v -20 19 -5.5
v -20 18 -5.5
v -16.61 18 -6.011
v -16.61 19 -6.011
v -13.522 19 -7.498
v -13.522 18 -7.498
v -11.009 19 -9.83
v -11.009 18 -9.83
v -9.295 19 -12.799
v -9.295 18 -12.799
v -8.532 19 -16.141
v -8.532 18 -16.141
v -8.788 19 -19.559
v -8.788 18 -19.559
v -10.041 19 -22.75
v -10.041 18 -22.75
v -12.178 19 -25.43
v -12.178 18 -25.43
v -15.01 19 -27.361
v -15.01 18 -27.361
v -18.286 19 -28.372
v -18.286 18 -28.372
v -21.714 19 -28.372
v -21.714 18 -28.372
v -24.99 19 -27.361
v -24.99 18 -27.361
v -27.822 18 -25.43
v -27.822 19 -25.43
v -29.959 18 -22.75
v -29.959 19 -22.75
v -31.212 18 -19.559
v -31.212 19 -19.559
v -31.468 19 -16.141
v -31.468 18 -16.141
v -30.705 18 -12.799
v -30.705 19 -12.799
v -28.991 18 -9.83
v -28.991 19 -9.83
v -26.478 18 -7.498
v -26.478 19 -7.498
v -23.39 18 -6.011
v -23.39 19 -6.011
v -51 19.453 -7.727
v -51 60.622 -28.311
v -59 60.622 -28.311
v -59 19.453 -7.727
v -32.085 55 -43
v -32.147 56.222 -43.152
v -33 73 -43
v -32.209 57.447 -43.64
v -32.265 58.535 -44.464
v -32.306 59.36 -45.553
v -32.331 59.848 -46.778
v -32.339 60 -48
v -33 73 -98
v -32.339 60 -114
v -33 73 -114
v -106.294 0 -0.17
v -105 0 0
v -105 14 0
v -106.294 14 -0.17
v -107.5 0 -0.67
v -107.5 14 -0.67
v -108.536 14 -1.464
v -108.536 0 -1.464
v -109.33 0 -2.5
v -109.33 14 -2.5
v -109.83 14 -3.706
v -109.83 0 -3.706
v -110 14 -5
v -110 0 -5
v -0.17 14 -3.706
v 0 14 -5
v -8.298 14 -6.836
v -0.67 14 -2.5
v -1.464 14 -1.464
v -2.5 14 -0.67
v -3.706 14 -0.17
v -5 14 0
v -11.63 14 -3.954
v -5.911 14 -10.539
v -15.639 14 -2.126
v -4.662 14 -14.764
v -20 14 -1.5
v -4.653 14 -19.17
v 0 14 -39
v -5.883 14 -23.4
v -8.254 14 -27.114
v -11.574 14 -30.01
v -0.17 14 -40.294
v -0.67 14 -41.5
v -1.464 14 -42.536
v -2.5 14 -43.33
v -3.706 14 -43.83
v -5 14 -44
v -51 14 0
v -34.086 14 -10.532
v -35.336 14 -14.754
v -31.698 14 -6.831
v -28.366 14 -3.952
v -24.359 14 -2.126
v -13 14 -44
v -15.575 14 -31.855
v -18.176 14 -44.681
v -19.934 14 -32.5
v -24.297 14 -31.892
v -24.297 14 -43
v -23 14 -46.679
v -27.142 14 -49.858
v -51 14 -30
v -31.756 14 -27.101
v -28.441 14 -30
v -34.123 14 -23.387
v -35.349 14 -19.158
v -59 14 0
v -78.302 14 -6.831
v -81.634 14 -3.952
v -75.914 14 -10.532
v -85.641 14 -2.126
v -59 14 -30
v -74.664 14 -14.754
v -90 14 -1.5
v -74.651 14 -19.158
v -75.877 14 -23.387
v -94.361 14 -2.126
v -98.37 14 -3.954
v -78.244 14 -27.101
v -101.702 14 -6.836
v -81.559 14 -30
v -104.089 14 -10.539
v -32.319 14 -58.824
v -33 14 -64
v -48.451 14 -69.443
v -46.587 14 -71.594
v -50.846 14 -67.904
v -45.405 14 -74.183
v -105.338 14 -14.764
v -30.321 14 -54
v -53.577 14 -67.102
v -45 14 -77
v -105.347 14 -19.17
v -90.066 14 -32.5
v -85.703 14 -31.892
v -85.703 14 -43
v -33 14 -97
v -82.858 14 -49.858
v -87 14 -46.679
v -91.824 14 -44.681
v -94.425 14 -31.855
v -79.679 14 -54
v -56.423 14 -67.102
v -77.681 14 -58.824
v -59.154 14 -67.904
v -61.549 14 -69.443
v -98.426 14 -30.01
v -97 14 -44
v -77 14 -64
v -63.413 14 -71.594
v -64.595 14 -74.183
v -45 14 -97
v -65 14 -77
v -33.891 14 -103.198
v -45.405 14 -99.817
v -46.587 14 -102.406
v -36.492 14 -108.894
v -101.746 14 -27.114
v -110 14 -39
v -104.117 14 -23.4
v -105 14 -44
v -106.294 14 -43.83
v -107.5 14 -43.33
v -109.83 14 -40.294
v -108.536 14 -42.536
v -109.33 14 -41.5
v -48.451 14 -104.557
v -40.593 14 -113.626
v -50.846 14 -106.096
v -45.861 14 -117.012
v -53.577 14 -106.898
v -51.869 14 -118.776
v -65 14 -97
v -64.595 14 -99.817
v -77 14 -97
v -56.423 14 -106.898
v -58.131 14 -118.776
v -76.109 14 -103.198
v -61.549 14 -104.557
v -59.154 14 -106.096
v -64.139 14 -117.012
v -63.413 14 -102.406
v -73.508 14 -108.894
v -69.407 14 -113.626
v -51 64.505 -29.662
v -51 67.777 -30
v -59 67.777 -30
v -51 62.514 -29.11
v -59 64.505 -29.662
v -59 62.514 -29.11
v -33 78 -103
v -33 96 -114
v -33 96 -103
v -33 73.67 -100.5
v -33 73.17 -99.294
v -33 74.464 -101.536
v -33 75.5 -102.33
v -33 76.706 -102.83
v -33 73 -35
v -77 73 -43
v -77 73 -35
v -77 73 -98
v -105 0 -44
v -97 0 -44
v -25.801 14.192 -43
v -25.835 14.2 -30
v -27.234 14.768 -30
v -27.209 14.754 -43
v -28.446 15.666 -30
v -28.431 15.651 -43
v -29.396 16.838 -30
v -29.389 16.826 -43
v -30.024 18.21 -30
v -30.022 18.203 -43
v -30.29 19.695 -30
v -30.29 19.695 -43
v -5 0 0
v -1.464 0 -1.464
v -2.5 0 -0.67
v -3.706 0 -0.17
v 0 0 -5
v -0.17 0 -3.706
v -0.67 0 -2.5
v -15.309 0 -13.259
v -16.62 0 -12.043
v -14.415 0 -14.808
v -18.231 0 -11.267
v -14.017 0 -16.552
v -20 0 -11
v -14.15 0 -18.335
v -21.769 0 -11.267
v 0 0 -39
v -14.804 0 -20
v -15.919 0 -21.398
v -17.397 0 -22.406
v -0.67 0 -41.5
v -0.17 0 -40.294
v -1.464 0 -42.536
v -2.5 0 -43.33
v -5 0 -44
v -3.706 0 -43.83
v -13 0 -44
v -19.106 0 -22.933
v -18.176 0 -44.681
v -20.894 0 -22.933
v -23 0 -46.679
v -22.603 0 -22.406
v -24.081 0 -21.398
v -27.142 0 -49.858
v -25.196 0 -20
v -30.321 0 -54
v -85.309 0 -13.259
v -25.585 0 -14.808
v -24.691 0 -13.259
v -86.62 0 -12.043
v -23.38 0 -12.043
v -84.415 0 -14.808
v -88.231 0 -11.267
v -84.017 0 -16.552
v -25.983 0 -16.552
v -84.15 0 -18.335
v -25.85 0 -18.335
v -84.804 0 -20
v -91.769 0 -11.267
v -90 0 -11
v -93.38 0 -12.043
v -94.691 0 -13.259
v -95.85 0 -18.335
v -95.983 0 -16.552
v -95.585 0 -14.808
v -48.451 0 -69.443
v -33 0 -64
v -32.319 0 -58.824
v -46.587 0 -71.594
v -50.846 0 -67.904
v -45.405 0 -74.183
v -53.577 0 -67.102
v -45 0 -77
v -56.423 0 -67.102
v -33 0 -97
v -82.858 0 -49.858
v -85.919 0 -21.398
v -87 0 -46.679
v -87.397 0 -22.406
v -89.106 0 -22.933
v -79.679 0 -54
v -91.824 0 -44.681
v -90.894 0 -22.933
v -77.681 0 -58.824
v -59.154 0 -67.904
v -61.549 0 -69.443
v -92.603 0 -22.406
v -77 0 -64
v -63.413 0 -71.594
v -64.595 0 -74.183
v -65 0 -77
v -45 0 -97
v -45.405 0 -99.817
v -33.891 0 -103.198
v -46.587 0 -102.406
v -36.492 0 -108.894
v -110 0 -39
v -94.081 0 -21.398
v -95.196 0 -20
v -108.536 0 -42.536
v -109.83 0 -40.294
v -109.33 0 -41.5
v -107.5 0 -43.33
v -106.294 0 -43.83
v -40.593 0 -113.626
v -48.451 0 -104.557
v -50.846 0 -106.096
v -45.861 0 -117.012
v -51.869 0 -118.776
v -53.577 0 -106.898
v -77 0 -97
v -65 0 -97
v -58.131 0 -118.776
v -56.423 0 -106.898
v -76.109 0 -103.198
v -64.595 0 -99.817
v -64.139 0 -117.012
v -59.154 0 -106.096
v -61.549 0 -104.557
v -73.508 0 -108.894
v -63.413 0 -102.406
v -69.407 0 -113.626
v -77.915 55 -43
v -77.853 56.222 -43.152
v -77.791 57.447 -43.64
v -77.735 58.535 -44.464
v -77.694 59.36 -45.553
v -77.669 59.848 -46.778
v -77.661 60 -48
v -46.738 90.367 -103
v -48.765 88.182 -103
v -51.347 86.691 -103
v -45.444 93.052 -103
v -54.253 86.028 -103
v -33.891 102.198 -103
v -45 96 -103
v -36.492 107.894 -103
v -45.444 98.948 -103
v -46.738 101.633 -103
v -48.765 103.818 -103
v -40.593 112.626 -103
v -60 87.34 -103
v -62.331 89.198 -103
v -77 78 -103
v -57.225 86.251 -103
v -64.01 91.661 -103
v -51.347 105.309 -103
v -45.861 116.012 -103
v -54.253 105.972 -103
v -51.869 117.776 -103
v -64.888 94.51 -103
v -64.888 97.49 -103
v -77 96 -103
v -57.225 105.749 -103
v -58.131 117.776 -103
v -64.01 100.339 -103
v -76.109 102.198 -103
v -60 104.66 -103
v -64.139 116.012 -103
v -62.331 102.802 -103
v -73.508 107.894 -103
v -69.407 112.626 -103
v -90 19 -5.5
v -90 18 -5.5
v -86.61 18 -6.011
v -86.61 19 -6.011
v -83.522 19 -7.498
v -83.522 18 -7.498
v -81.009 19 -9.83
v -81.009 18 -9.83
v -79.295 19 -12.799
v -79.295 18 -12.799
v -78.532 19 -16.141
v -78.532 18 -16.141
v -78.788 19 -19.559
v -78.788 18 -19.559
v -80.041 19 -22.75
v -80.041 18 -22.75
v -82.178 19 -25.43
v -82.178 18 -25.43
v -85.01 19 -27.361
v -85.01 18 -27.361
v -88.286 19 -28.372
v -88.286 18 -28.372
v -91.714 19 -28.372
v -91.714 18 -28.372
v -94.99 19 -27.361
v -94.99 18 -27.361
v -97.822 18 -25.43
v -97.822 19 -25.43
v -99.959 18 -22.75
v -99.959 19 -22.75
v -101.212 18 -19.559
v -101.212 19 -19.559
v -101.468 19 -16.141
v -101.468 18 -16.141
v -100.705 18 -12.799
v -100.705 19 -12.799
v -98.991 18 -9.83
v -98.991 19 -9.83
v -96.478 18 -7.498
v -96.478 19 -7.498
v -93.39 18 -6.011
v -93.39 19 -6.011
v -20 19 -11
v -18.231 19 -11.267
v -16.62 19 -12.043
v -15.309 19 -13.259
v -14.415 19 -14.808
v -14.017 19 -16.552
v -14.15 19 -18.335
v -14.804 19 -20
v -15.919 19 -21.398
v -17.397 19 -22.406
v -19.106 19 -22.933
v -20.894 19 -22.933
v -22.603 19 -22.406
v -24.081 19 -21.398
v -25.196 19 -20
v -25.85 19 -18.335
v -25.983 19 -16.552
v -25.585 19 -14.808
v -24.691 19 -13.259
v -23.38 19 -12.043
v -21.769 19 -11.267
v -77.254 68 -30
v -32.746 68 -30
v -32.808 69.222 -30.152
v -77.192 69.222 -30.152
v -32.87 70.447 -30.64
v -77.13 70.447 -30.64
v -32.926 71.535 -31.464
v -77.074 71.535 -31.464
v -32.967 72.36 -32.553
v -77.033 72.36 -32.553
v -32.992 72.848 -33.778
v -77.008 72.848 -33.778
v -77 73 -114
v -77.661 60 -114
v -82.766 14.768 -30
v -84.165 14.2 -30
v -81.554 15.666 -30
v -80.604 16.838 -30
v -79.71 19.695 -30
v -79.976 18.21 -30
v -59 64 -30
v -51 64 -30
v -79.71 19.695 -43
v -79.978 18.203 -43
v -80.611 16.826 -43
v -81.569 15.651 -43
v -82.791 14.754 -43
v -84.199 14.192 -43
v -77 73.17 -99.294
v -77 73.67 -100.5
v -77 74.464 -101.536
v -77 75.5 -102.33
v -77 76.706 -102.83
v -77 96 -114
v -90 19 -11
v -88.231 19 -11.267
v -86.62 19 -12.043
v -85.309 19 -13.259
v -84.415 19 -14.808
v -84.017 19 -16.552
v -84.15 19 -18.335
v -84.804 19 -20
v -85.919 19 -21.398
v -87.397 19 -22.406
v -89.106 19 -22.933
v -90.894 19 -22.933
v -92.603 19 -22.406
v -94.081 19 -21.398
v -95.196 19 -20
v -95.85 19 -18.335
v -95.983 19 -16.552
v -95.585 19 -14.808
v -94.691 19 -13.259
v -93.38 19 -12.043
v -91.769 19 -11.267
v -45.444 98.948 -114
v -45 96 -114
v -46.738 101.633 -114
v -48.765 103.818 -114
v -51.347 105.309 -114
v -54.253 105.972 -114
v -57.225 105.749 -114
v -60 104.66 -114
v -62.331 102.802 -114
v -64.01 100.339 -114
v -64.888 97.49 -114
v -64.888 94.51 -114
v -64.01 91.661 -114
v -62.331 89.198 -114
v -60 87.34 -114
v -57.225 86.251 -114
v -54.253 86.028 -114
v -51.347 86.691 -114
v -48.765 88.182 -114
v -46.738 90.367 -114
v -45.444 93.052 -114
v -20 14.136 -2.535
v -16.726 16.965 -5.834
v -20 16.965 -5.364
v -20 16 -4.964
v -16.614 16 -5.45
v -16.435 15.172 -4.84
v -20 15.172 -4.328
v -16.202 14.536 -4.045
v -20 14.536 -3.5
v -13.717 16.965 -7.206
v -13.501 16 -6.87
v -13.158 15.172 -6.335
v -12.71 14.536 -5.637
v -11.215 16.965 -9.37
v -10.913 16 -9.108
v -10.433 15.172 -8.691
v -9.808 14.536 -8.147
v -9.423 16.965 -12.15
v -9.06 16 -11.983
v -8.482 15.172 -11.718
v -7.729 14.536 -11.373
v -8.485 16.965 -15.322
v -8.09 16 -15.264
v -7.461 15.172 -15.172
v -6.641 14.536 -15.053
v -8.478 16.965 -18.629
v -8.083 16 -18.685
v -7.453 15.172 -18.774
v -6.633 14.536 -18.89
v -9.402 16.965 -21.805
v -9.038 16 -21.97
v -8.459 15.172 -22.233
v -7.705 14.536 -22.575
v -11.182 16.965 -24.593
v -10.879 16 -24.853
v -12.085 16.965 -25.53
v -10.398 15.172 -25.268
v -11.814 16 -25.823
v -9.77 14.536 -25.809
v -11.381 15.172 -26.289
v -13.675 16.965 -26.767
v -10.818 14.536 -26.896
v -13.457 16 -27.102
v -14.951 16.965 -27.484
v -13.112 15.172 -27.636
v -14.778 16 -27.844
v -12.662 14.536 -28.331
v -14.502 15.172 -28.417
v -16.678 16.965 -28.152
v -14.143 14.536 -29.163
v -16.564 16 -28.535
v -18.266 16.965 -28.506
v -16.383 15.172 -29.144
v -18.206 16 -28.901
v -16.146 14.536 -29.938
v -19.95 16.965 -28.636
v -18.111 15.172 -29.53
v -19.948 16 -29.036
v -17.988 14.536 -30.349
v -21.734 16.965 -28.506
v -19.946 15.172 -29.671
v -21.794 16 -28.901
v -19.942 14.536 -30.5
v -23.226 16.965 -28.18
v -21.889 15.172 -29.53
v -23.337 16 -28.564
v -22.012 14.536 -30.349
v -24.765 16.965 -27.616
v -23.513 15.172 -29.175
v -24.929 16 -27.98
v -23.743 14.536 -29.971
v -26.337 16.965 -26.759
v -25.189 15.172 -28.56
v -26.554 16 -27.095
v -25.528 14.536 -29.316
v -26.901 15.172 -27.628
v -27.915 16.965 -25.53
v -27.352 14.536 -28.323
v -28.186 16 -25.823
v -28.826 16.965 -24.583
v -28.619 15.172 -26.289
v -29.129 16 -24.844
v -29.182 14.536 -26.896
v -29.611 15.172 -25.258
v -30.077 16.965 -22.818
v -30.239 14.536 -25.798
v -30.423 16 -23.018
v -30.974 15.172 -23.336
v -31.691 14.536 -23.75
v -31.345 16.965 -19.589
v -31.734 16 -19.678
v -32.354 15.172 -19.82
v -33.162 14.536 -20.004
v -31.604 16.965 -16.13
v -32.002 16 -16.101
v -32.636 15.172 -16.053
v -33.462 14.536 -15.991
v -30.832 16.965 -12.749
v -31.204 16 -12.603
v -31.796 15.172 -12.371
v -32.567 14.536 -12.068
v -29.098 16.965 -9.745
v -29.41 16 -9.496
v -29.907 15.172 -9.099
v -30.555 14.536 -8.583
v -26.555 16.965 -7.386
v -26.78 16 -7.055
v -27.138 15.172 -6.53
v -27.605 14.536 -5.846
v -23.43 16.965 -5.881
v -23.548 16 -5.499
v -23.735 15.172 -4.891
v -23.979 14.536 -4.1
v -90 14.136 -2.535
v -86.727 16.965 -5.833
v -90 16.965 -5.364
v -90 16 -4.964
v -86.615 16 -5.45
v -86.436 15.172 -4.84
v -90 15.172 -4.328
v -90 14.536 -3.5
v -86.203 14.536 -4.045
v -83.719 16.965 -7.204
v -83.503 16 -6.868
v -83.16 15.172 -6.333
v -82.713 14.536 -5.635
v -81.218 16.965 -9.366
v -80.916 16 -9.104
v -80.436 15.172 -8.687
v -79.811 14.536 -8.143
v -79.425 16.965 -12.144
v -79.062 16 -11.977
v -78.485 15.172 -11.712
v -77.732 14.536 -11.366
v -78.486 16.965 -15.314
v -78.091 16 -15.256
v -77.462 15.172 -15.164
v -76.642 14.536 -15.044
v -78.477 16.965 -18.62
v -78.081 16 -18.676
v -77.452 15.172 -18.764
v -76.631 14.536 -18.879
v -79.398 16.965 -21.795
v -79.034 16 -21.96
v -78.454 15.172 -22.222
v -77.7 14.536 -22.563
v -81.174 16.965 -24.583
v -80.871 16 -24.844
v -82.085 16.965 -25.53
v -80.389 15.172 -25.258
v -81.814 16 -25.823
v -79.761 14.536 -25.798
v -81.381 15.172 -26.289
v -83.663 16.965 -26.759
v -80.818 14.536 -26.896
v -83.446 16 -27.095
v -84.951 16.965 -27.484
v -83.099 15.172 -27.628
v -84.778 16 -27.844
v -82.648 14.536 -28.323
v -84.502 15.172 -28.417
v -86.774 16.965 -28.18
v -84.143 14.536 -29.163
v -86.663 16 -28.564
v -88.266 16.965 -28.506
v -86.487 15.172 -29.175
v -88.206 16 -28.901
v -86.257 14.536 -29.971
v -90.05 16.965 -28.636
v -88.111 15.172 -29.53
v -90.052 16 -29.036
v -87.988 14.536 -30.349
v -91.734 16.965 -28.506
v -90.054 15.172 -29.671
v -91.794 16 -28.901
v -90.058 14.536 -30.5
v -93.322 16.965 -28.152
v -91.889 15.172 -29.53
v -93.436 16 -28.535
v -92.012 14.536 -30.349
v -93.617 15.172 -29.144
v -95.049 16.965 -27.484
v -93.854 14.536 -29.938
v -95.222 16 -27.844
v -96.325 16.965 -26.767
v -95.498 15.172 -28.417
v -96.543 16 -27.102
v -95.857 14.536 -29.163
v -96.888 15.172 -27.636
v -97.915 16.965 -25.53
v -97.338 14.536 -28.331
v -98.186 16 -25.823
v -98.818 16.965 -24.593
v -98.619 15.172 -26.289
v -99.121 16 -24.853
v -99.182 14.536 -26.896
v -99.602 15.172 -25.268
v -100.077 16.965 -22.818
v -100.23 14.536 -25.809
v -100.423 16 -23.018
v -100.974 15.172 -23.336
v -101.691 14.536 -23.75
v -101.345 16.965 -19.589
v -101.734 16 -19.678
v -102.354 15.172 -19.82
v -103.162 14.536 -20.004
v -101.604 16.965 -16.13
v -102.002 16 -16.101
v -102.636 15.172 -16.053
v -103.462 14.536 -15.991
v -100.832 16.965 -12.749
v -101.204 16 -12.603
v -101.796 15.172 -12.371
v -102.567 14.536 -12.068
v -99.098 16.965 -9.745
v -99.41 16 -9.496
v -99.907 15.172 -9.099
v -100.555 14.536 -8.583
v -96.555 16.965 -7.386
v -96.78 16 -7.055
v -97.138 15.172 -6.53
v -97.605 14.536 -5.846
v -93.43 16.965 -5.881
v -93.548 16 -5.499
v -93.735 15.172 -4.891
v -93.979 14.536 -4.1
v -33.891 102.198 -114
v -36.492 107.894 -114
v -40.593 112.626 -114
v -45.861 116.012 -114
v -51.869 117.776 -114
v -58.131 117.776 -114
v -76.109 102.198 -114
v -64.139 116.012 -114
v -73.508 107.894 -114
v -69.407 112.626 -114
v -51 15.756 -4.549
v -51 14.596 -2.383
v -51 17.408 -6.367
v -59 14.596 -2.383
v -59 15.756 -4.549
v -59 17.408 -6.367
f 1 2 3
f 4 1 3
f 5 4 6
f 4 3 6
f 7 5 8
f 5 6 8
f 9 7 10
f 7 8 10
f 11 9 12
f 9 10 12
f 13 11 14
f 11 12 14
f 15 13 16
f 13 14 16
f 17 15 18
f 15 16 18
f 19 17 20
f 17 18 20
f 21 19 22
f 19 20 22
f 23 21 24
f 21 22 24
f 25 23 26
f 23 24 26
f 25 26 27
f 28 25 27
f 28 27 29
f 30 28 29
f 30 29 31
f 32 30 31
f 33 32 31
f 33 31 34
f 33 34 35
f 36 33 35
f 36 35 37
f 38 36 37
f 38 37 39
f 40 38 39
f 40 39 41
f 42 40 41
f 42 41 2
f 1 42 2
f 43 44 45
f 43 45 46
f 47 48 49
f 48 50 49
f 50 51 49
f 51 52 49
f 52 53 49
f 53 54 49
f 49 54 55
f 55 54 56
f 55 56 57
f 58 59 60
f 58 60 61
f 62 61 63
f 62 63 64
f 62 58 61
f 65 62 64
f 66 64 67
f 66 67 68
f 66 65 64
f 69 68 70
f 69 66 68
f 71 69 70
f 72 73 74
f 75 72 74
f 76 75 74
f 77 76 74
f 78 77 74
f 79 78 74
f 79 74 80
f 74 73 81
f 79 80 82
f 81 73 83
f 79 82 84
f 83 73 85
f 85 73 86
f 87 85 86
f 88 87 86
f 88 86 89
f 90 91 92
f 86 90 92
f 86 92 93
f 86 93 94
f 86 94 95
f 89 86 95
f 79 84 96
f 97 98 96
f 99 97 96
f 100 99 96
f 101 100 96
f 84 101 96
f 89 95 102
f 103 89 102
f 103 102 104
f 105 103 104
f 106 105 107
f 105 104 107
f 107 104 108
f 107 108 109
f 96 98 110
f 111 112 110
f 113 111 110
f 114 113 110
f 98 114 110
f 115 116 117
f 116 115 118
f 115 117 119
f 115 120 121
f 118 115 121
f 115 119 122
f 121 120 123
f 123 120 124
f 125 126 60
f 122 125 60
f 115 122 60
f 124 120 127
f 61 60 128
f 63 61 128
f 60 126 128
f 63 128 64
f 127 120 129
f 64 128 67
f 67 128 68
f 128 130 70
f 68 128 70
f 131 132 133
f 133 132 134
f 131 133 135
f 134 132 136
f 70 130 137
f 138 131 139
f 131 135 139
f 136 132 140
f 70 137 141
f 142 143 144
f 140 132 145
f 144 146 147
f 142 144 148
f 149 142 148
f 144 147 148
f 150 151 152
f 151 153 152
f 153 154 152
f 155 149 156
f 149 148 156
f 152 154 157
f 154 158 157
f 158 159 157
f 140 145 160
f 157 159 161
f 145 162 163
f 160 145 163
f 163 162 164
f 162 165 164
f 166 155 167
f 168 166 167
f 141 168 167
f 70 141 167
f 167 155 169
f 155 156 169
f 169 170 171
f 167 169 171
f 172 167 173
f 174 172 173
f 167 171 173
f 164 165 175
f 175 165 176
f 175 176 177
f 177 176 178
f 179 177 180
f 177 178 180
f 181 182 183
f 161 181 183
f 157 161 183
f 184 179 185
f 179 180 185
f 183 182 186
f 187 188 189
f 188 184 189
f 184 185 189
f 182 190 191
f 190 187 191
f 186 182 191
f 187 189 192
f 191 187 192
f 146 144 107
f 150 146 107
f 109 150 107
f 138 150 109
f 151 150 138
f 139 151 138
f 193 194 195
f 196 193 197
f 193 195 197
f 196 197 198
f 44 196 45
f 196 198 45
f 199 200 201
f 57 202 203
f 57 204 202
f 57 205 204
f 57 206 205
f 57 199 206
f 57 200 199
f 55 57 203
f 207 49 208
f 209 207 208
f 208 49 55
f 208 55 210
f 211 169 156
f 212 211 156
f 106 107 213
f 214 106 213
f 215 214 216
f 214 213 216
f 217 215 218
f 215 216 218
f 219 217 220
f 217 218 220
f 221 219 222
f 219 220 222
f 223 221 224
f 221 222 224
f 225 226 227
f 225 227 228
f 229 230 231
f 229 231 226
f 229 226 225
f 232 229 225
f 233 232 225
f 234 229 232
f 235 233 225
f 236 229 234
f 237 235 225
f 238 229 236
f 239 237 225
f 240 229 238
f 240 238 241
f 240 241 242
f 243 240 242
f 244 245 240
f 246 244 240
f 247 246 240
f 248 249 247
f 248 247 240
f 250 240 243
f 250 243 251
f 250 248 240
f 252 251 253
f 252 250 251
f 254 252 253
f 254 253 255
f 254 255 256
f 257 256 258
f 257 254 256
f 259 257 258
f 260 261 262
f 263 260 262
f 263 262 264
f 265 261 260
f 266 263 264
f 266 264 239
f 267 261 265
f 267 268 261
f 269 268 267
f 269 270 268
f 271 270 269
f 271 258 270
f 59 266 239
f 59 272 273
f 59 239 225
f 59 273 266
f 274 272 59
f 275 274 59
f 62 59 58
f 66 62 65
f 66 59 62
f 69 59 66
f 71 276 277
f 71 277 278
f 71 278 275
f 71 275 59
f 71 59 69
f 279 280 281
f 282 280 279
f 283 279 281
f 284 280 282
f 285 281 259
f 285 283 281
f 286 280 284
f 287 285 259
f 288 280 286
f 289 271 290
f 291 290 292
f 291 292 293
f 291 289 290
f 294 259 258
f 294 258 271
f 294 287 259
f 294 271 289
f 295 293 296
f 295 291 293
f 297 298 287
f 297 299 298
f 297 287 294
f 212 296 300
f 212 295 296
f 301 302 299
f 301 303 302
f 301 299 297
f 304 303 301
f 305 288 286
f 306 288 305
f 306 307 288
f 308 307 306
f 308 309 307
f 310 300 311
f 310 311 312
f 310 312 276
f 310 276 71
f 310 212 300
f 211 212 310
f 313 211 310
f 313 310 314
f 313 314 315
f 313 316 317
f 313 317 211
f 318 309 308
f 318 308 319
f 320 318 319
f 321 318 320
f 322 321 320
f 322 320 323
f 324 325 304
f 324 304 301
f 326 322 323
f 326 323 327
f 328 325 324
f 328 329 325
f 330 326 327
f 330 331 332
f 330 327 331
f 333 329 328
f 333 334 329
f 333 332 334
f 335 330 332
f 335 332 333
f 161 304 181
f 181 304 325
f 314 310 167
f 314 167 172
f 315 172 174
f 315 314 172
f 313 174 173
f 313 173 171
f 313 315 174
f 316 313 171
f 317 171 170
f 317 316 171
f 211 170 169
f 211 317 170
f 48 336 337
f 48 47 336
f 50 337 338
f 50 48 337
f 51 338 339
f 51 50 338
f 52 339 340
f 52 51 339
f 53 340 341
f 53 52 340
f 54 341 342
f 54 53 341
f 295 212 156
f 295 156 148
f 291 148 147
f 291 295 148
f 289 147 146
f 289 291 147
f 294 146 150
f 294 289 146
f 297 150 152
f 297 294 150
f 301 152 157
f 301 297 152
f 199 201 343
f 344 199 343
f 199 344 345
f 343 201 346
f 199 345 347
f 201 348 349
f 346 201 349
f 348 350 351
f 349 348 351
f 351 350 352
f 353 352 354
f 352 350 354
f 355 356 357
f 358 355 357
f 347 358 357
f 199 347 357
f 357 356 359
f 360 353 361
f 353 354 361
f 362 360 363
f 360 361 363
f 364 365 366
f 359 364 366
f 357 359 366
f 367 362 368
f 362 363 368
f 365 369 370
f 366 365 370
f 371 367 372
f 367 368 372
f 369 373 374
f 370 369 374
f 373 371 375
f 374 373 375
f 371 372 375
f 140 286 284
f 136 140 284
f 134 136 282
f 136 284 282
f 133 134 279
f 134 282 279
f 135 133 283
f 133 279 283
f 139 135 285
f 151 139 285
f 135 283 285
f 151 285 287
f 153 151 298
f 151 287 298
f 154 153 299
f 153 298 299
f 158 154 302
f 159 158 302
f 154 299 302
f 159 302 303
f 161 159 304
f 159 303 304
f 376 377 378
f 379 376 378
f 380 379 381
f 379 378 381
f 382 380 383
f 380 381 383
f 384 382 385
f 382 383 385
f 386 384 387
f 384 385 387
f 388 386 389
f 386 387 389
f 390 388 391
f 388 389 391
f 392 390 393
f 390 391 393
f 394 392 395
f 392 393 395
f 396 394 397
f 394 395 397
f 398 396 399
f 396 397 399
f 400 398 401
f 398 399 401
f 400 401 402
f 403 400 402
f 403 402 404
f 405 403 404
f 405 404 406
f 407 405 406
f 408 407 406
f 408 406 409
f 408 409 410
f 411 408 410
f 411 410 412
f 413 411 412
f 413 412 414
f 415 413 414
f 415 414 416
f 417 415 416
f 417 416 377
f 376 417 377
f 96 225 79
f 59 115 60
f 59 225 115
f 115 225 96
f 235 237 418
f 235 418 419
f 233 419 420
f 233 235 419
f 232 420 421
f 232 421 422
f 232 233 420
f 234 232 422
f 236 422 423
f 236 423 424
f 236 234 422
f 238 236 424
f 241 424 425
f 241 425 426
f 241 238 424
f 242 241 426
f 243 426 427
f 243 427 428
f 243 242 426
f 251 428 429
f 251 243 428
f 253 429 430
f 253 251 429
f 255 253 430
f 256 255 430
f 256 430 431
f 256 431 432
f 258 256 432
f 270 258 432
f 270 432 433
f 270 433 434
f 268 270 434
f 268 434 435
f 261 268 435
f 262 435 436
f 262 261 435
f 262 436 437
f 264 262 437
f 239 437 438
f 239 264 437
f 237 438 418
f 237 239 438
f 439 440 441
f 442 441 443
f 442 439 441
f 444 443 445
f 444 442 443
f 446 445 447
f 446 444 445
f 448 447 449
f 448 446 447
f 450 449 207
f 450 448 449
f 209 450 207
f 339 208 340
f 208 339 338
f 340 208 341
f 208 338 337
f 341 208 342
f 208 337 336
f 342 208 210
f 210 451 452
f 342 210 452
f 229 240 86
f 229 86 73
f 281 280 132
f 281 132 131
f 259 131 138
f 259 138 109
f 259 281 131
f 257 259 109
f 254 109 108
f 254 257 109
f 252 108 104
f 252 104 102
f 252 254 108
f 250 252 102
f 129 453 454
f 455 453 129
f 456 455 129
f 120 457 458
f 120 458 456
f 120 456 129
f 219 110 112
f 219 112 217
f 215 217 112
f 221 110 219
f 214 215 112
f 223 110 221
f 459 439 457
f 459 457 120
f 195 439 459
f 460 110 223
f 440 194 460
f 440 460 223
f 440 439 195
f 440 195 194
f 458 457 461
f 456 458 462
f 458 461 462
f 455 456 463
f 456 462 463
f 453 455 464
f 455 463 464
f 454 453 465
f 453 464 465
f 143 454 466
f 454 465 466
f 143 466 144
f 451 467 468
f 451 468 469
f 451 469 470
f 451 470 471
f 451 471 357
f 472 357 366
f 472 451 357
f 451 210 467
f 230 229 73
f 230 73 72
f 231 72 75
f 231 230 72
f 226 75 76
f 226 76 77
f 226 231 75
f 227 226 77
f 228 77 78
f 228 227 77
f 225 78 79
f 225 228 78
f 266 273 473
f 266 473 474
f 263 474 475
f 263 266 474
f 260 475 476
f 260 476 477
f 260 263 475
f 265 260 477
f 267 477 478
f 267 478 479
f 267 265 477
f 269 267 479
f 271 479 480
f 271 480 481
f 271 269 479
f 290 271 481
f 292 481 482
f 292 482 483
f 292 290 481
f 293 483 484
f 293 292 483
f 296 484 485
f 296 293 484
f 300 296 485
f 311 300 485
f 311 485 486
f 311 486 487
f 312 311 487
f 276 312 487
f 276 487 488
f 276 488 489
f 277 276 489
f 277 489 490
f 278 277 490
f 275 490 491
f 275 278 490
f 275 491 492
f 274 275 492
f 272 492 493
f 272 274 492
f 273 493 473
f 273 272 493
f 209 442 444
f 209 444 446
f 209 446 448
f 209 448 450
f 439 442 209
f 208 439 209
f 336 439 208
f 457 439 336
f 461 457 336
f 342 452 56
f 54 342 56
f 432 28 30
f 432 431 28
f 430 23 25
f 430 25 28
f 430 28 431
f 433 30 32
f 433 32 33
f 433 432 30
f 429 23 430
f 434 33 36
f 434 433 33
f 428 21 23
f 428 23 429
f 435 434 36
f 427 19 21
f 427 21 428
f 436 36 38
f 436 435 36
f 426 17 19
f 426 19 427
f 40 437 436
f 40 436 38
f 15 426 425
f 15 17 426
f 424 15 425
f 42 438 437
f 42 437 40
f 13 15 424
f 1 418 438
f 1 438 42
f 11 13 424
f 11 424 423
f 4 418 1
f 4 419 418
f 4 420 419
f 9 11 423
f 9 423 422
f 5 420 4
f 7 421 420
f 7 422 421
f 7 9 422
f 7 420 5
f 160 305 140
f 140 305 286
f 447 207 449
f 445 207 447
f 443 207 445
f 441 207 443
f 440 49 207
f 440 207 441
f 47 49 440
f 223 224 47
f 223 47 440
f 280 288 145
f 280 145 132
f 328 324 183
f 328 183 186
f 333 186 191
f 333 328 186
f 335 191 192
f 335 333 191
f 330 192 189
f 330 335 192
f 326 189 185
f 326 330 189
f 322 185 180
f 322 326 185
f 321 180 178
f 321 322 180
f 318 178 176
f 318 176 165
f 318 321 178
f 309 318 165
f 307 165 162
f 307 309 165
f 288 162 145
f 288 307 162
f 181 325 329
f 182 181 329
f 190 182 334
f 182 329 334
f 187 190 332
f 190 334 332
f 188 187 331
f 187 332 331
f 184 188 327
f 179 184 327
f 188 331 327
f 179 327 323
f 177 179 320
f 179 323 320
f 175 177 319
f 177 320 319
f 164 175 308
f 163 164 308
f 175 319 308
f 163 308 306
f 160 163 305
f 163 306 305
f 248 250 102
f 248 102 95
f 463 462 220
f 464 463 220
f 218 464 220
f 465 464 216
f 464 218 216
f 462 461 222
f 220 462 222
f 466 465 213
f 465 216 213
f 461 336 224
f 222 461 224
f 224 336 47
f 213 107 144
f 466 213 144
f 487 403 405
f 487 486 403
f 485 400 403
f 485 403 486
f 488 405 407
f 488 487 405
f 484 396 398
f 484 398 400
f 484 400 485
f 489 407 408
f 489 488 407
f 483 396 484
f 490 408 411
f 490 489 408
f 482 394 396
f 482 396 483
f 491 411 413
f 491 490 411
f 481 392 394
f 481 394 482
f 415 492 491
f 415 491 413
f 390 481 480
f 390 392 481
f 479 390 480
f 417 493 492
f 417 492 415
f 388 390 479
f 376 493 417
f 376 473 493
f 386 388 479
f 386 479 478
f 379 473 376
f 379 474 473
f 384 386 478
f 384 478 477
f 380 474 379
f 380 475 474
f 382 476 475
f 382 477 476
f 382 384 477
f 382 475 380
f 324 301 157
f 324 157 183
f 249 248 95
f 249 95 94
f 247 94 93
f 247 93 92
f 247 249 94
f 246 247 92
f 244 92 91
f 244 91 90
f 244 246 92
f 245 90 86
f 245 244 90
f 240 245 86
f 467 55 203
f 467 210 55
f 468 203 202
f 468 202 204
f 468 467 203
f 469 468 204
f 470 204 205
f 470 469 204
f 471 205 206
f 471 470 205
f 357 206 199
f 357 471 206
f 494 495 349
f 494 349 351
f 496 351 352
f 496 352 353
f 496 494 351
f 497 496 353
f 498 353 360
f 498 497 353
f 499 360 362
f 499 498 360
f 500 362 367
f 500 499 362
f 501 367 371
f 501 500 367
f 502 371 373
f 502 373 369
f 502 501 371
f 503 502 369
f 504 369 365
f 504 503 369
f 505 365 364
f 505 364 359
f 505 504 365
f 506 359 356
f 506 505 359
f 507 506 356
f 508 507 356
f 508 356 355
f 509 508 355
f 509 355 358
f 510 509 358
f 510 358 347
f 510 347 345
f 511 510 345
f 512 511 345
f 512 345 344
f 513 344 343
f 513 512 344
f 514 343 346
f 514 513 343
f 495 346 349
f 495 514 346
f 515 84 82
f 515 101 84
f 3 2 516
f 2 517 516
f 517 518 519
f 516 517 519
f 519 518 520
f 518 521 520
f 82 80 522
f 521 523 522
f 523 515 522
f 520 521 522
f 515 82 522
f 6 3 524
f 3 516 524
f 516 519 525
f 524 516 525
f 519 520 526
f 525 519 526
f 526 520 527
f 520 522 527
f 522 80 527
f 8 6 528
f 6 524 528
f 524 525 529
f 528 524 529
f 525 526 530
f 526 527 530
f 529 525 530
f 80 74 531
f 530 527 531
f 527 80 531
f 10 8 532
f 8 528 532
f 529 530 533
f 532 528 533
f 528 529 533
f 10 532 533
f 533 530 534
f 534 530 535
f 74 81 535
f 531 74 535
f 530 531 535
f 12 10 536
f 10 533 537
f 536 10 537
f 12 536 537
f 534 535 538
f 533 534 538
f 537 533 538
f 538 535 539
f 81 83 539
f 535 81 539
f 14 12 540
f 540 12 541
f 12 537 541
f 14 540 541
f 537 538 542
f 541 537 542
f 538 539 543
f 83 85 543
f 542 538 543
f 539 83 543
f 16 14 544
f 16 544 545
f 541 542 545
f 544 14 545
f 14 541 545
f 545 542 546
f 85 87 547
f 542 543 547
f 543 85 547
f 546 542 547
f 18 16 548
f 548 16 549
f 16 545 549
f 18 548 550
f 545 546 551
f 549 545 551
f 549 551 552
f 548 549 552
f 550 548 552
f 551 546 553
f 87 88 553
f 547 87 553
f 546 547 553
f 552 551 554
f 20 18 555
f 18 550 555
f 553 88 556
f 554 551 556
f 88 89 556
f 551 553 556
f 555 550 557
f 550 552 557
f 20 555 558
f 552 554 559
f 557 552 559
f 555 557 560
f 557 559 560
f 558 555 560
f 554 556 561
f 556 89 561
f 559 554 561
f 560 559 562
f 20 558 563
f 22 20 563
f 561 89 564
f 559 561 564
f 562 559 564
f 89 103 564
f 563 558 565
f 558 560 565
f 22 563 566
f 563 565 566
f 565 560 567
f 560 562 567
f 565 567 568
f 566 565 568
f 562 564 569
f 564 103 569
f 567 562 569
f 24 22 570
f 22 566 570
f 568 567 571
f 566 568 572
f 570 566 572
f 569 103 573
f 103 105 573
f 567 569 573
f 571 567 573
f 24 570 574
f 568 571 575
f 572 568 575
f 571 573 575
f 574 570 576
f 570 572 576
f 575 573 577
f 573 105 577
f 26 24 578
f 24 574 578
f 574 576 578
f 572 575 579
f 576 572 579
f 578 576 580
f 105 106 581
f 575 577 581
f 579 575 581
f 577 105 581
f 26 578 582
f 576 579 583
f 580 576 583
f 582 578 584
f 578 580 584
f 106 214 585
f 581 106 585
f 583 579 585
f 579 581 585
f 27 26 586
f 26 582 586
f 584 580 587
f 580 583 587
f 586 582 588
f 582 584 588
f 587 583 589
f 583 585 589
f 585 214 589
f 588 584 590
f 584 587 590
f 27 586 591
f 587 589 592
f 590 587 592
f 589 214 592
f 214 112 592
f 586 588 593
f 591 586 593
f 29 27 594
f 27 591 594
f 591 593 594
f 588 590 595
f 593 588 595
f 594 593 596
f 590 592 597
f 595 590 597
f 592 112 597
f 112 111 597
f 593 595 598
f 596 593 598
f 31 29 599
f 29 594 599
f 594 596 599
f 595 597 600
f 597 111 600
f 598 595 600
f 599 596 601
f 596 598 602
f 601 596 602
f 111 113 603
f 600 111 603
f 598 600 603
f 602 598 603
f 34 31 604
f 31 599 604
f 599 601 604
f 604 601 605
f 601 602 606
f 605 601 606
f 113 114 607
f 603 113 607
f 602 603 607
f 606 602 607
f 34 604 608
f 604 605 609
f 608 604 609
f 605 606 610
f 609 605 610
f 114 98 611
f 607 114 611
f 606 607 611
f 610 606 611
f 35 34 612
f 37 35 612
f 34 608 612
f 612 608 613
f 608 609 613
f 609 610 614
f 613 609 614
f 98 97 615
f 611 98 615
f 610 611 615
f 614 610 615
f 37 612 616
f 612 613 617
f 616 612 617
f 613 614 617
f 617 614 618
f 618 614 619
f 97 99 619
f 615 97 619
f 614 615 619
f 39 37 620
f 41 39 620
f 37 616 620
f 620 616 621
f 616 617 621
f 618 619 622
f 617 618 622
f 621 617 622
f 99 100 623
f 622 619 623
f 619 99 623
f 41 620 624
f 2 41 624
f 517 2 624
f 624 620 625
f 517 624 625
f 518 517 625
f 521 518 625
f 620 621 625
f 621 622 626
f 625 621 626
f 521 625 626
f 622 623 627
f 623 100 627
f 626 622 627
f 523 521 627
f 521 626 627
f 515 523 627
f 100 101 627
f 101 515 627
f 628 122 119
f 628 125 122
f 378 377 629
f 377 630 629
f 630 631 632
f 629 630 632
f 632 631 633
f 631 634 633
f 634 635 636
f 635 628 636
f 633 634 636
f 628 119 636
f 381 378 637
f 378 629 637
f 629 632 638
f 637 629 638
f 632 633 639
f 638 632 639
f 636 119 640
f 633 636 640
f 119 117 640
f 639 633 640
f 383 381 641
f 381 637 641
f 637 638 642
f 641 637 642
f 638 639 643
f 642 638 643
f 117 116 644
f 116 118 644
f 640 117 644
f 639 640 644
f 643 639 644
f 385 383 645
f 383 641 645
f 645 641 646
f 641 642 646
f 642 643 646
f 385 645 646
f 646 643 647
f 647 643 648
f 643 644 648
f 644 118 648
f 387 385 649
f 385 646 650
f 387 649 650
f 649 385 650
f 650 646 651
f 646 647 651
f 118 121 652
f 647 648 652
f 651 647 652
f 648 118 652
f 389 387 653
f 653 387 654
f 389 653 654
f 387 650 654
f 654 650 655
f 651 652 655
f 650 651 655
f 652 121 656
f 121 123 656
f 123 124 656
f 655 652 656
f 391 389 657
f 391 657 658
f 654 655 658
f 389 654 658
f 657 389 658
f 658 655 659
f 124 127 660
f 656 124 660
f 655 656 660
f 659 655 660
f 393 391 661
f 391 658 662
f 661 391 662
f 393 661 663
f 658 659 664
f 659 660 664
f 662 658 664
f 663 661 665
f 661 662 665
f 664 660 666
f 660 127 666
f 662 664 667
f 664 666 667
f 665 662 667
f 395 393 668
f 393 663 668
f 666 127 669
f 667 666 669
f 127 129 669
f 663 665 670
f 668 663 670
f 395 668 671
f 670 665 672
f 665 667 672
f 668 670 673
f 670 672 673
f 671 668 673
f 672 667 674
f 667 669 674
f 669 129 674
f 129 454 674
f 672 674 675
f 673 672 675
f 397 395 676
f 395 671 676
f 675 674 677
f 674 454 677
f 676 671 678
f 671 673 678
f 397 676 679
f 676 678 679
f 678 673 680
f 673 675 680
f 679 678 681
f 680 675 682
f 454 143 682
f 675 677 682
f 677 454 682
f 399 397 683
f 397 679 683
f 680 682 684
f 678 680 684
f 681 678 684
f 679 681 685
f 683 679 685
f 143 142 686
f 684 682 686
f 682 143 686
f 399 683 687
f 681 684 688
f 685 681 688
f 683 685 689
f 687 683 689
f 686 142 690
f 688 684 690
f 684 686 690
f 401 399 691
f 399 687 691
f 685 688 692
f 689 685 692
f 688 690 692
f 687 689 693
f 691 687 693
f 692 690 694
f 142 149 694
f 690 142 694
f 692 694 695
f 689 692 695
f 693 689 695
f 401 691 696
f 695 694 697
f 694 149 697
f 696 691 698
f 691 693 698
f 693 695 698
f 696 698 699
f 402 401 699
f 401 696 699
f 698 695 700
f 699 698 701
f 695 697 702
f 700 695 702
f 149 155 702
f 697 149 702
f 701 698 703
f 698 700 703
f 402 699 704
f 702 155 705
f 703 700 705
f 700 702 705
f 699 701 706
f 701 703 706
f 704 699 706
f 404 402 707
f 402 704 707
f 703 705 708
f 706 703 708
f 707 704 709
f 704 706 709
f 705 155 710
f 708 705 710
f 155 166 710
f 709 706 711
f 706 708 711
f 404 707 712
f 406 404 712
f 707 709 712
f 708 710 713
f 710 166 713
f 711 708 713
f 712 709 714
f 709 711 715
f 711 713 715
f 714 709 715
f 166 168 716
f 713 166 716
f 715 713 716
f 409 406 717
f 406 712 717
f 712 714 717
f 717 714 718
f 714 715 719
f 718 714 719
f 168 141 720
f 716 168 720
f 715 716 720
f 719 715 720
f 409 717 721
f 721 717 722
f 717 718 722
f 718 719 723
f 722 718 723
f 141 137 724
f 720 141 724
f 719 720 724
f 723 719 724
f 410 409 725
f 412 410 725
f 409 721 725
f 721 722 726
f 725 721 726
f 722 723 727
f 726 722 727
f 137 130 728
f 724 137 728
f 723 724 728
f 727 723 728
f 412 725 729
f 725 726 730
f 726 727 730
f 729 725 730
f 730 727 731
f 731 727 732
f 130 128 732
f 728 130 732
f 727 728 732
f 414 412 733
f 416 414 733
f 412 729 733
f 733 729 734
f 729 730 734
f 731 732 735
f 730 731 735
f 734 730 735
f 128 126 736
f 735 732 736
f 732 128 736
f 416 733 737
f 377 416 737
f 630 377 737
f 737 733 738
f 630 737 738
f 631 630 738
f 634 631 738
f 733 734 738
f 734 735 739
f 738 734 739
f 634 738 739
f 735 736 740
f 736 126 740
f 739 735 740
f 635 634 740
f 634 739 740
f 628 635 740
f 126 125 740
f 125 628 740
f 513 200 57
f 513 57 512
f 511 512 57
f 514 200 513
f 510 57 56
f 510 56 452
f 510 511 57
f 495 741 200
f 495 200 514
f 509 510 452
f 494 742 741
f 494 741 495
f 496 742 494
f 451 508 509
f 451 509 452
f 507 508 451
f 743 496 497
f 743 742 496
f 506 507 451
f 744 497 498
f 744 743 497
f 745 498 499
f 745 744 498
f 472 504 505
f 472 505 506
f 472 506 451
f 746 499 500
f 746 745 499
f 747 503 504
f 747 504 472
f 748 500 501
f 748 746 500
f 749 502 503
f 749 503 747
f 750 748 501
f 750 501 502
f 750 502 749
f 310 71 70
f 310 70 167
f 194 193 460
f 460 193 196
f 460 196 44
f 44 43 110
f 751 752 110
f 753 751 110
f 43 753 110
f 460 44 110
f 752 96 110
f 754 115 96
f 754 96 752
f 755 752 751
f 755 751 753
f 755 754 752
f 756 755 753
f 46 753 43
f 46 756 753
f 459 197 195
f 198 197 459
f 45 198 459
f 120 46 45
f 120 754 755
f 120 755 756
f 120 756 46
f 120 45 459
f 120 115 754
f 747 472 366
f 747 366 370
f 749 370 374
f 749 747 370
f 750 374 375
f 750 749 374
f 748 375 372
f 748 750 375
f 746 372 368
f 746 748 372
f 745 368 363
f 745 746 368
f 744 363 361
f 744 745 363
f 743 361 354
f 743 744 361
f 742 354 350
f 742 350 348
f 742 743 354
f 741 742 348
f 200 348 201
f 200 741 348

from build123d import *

# Parameters (mm, degrees)
SKETCH1_R           = 11.5
BOSS_EXTRUDE1_DEPTH = 14
SKETCH1_3_R         = 11.5
SKETCH1_3_R_2       = 6
BOSS_EXTRUDE2_DEPTH = 19
BOSS_EXTRUDE3_DEPTH = 4
SKETCH8_R           = 10
BOSS_EXTRUDE4_DEPTH = 11
FILLET1_R           = 10
FILLET2_R           = 16
FILLET10_R          = 5
FILLET8_R           = 4
FILLET9_START       = -43
FILLET9_DEPTH       = 13


with BuildPart() as part:
    # Sketch1 → Boss-Extrude1 (new body)
    with BuildSketch(Plane(origin=(0, 0, 0), x_dir=(1, 0, 0), z_dir=(0, 1, 0))):
        with BuildLine():
            Line((-77, 64), (-77, 97))
            ThreePointArc((-77, 97), (-55, 119), (-33, 97))
            Line((-33, 97), (-33, 64))
            ThreePointArc((-33, 64), (-27.142135624, 49.857864376), (-13, 44))
            Line((-13, 44), (-5, 44))
            ThreePointArc((-5, 44), (-1.464466094, 42.535533906), (0, 39))
            Line((0, 39), (0, 5))
            ThreePointArc((0, 5), (-1.464466094, 1.464466094), (-5, 0))
            Line((-5, 0), (-105, 0))
            ThreePointArc((-105, 0), (-108.535533906, 1.464466094), (-110, 5))
            Line((-110, 5), (-110, 39))
            ThreePointArc((-110, 39), (-108.535533906, 42.535533906), (-105, 44))
            Line((-105, 44), (-97, 44))
            ThreePointArc((-97, 44), (-82.857864376, 49.857864376), (-77, 64))
        make_face()
        with Locations(Location((-20, 17, 0), (0, 0, 270))):
            Circle(SKETCH1_R, mode=Mode.SUBTRACT)
        with Locations(Location((-90, 17, 0), (0, 0, 270))):
            Circle(SKETCH1_R, mode=Mode.SUBTRACT)
        with BuildLine():
            Line((-45, 97), (-45, 77))
            ThreePointArc((-45, 77), (-55, 67), (-65, 77))
            Line((-65, 77), (-65, 97))
            ThreePointArc((-65, 97), (-55, 107), (-45, 97))
        make_face(mode=Mode.SUBTRACT)
    extrude(amount=BOSS_EXTRUDE1_DEPTH)

    # Sketch1<3> → Boss-Extrude2 (add)
    # profile 1 of 2: a face of its own
    with BuildSketch(Plane(origin=(0, 0, 0), x_dir=(1, 0, 0), z_dir=(0, 1, 0))):
        with Locations(Location((-90, 17, 0), (0, 0, 270))):
            Circle(SKETCH1_3_R)
        with Locations(Location((-90, 17, 0), (0, 0, 270))):
            Circle(SKETCH1_3_R_2, mode=Mode.SUBTRACT)
    # profile 2 of 2: a face of its own
    with BuildSketch(Plane(origin=(0, 0, 0), x_dir=(1, 0, 0), z_dir=(0, 1, 0))):
        with Locations(Location((-20, 17, 0), (0, 0, 270))):
            Circle(SKETCH1_3_R)
        with Locations(Location((-20, 17, 0), (0, 0, 270))):
            Circle(SKETCH1_3_R_2, mode=Mode.SUBTRACT)
    extrude(amount=BOSS_EXTRUDE2_DEPTH)

    # Sketch3 → Loft1 section 0
    with BuildSketch(Plane(origin=(0, 73, 0), x_dir=(1, 0, 0), z_dir=(0, 1, 0))):
        with BuildLine():
            Line((-77, 43), (-33, 43))
            Line((-33, 43), (-33, 30))
            Line((-33, 30), (-77, 30))
            Line((-77, 30), (-77, 43))
        make_face()
    # Sketch2 → Loft1 section 1
    with BuildSketch(Plane(origin=(0, 14, 0), x_dir=(1, 0, 0), z_dir=(0, 1, 0))):
        with BuildLine():
            Line((-80, 43), (-30, 43))
            Line((-30, 43), (-30, 30))
            Line((-30, 30), (-80, 30))
            Line((-80, 30), (-80, 43))
        make_face()
    loft()

    # Sketch4 → Boss-Extrude3 (add, symmetric)
    with BuildSketch(Plane(origin=(-55, 0, 0), x_dir=(0, 0, -1), z_dir=(1, 0, 0))):
        Polygon((30, 64), (5, 14), (30, 14), align=None)
    extrude(amount=BOSS_EXTRUDE3_DEPTH, both=True)

    # Sketch7 → Loft2 section 0
    with BuildSketch(Plane(origin=(0, 0, -43), x_dir=(-1, 0, 0), z_dir=(0, 0, -1))):
        with BuildLine():
            Line((77, 73), (77.661016949, 60))
            Line((77.661016949, 60), (32.338983051, 60))
            Line((32.338983051, 60), (33, 73))
            Line((33, 73), (77, 73))
        make_face()
    # Sketch6 → Loft2 section 1
    with BuildSketch(Plane.XY.offset(-114)):
        with BuildLine():
            Line((-77, 73), (-77.661016949, 60))
            Line((-77.661016949, 60), (-32.338983051, 60))
            Line((-32.338983051, 60), (-33, 73))
            Line((-33, 73), (-77, 73))
        make_face()
    loft()

    # Sketch8 → Boss-Extrude4 (add)
    with BuildSketch(Plane.XY.offset(-114)):
        with BuildLine():
            Line((-77, 73), (-77, 96))
            ThreePointArc((-77, 96), (-55, 118), (-33, 96))
            Line((-33, 96), (-33, 73))
            Line((-33, 73), (-77, 73))
        make_face()
        with Locations((-55, 96)):
            Circle(SKETCH8_R, mode=Mode.SUBTRACT)
    extrude(amount=BOSS_EXTRUDE4_DEPTH)

    # Fillet1
    # the kernel refuses this fillet: 10 mm, written as the material it adds along each edge
    with BuildSketch(Plane(origin=(-59, 14, -5), x_dir=(0, 0, 1), z_dir=(1, 0, 0))) as fillet1_piece_1:
        with BuildLine():
            CenterArc((6.217538244, -9.925603288), FILLET1_R, 96.993331588, 56.441617235)
            Line((-2.726733666, -5.453467333), (-2.905619105, -5.364024614))
            Line((-2.905619105, -5.364024614), (-0.178885438, 0.089442719))
            Line((-0.178885438, 0.089442719), (0, 0.2))
            ThreePointArc((0, 0.2), (2.5, 0.2), (4.975649235, 0.198512066))
            Line((4.975649235, 0.198512066), (5, 0))
        make_face()
    extrude(amount=8)

    # Fillet2
    fillet2_edges = [part.edges().sort_by_distance(p)[0] for p in [
        (-55, 64, -30),
    ]]
    fillet(fillet2_edges, radius=FILLET2_R)

    # Fillet10
    fillet10_edges = [part.edges().sort_by_distance(p)[0] for p in [
        (-55, 60, -43),
        (-55, 73, -103),
        (-55, 73, -30),
    ]]
    fillet(fillet10_edges, radius=FILLET10_R)

    # Fillet8
    fillet8_edges = [part.edges().sort_by_distance(p)[0] for p in [
        (-90, 14, -28.5),
        (-20, 14, -28.5),
    ]]
    fillet(fillet8_edges, radius=FILLET8_R)

    # Fillet9: read off the stored shape, not the designer's step
    # Fillet9 outline → Fillet9 (add)
    with BuildSketch(Plane.XY.offset(FILLET9_START)):
        with BuildLine():
            Line((-80, 14), (-79.710408023, 19.695308884))
            ThreePointArc((-79.710408023, 19.695308884), (-81.56915401, 15.650968689), (-85.702666639, 14))
            Line((-85.702666639, 14), (-80, 14))
        make_face()
        with BuildLine():
            Line((-30.289591977, 19.695308884), (-30, 14))
            Line((-30, 14), (-24.297333361, 14))
            ThreePointArc((-24.297333361, 14), (-28.43084599, 15.650968689), (-30.289591977, 19.695308884))
        make_face()
    extrude(amount=FILLET9_DEPTH)


solid = part.part
